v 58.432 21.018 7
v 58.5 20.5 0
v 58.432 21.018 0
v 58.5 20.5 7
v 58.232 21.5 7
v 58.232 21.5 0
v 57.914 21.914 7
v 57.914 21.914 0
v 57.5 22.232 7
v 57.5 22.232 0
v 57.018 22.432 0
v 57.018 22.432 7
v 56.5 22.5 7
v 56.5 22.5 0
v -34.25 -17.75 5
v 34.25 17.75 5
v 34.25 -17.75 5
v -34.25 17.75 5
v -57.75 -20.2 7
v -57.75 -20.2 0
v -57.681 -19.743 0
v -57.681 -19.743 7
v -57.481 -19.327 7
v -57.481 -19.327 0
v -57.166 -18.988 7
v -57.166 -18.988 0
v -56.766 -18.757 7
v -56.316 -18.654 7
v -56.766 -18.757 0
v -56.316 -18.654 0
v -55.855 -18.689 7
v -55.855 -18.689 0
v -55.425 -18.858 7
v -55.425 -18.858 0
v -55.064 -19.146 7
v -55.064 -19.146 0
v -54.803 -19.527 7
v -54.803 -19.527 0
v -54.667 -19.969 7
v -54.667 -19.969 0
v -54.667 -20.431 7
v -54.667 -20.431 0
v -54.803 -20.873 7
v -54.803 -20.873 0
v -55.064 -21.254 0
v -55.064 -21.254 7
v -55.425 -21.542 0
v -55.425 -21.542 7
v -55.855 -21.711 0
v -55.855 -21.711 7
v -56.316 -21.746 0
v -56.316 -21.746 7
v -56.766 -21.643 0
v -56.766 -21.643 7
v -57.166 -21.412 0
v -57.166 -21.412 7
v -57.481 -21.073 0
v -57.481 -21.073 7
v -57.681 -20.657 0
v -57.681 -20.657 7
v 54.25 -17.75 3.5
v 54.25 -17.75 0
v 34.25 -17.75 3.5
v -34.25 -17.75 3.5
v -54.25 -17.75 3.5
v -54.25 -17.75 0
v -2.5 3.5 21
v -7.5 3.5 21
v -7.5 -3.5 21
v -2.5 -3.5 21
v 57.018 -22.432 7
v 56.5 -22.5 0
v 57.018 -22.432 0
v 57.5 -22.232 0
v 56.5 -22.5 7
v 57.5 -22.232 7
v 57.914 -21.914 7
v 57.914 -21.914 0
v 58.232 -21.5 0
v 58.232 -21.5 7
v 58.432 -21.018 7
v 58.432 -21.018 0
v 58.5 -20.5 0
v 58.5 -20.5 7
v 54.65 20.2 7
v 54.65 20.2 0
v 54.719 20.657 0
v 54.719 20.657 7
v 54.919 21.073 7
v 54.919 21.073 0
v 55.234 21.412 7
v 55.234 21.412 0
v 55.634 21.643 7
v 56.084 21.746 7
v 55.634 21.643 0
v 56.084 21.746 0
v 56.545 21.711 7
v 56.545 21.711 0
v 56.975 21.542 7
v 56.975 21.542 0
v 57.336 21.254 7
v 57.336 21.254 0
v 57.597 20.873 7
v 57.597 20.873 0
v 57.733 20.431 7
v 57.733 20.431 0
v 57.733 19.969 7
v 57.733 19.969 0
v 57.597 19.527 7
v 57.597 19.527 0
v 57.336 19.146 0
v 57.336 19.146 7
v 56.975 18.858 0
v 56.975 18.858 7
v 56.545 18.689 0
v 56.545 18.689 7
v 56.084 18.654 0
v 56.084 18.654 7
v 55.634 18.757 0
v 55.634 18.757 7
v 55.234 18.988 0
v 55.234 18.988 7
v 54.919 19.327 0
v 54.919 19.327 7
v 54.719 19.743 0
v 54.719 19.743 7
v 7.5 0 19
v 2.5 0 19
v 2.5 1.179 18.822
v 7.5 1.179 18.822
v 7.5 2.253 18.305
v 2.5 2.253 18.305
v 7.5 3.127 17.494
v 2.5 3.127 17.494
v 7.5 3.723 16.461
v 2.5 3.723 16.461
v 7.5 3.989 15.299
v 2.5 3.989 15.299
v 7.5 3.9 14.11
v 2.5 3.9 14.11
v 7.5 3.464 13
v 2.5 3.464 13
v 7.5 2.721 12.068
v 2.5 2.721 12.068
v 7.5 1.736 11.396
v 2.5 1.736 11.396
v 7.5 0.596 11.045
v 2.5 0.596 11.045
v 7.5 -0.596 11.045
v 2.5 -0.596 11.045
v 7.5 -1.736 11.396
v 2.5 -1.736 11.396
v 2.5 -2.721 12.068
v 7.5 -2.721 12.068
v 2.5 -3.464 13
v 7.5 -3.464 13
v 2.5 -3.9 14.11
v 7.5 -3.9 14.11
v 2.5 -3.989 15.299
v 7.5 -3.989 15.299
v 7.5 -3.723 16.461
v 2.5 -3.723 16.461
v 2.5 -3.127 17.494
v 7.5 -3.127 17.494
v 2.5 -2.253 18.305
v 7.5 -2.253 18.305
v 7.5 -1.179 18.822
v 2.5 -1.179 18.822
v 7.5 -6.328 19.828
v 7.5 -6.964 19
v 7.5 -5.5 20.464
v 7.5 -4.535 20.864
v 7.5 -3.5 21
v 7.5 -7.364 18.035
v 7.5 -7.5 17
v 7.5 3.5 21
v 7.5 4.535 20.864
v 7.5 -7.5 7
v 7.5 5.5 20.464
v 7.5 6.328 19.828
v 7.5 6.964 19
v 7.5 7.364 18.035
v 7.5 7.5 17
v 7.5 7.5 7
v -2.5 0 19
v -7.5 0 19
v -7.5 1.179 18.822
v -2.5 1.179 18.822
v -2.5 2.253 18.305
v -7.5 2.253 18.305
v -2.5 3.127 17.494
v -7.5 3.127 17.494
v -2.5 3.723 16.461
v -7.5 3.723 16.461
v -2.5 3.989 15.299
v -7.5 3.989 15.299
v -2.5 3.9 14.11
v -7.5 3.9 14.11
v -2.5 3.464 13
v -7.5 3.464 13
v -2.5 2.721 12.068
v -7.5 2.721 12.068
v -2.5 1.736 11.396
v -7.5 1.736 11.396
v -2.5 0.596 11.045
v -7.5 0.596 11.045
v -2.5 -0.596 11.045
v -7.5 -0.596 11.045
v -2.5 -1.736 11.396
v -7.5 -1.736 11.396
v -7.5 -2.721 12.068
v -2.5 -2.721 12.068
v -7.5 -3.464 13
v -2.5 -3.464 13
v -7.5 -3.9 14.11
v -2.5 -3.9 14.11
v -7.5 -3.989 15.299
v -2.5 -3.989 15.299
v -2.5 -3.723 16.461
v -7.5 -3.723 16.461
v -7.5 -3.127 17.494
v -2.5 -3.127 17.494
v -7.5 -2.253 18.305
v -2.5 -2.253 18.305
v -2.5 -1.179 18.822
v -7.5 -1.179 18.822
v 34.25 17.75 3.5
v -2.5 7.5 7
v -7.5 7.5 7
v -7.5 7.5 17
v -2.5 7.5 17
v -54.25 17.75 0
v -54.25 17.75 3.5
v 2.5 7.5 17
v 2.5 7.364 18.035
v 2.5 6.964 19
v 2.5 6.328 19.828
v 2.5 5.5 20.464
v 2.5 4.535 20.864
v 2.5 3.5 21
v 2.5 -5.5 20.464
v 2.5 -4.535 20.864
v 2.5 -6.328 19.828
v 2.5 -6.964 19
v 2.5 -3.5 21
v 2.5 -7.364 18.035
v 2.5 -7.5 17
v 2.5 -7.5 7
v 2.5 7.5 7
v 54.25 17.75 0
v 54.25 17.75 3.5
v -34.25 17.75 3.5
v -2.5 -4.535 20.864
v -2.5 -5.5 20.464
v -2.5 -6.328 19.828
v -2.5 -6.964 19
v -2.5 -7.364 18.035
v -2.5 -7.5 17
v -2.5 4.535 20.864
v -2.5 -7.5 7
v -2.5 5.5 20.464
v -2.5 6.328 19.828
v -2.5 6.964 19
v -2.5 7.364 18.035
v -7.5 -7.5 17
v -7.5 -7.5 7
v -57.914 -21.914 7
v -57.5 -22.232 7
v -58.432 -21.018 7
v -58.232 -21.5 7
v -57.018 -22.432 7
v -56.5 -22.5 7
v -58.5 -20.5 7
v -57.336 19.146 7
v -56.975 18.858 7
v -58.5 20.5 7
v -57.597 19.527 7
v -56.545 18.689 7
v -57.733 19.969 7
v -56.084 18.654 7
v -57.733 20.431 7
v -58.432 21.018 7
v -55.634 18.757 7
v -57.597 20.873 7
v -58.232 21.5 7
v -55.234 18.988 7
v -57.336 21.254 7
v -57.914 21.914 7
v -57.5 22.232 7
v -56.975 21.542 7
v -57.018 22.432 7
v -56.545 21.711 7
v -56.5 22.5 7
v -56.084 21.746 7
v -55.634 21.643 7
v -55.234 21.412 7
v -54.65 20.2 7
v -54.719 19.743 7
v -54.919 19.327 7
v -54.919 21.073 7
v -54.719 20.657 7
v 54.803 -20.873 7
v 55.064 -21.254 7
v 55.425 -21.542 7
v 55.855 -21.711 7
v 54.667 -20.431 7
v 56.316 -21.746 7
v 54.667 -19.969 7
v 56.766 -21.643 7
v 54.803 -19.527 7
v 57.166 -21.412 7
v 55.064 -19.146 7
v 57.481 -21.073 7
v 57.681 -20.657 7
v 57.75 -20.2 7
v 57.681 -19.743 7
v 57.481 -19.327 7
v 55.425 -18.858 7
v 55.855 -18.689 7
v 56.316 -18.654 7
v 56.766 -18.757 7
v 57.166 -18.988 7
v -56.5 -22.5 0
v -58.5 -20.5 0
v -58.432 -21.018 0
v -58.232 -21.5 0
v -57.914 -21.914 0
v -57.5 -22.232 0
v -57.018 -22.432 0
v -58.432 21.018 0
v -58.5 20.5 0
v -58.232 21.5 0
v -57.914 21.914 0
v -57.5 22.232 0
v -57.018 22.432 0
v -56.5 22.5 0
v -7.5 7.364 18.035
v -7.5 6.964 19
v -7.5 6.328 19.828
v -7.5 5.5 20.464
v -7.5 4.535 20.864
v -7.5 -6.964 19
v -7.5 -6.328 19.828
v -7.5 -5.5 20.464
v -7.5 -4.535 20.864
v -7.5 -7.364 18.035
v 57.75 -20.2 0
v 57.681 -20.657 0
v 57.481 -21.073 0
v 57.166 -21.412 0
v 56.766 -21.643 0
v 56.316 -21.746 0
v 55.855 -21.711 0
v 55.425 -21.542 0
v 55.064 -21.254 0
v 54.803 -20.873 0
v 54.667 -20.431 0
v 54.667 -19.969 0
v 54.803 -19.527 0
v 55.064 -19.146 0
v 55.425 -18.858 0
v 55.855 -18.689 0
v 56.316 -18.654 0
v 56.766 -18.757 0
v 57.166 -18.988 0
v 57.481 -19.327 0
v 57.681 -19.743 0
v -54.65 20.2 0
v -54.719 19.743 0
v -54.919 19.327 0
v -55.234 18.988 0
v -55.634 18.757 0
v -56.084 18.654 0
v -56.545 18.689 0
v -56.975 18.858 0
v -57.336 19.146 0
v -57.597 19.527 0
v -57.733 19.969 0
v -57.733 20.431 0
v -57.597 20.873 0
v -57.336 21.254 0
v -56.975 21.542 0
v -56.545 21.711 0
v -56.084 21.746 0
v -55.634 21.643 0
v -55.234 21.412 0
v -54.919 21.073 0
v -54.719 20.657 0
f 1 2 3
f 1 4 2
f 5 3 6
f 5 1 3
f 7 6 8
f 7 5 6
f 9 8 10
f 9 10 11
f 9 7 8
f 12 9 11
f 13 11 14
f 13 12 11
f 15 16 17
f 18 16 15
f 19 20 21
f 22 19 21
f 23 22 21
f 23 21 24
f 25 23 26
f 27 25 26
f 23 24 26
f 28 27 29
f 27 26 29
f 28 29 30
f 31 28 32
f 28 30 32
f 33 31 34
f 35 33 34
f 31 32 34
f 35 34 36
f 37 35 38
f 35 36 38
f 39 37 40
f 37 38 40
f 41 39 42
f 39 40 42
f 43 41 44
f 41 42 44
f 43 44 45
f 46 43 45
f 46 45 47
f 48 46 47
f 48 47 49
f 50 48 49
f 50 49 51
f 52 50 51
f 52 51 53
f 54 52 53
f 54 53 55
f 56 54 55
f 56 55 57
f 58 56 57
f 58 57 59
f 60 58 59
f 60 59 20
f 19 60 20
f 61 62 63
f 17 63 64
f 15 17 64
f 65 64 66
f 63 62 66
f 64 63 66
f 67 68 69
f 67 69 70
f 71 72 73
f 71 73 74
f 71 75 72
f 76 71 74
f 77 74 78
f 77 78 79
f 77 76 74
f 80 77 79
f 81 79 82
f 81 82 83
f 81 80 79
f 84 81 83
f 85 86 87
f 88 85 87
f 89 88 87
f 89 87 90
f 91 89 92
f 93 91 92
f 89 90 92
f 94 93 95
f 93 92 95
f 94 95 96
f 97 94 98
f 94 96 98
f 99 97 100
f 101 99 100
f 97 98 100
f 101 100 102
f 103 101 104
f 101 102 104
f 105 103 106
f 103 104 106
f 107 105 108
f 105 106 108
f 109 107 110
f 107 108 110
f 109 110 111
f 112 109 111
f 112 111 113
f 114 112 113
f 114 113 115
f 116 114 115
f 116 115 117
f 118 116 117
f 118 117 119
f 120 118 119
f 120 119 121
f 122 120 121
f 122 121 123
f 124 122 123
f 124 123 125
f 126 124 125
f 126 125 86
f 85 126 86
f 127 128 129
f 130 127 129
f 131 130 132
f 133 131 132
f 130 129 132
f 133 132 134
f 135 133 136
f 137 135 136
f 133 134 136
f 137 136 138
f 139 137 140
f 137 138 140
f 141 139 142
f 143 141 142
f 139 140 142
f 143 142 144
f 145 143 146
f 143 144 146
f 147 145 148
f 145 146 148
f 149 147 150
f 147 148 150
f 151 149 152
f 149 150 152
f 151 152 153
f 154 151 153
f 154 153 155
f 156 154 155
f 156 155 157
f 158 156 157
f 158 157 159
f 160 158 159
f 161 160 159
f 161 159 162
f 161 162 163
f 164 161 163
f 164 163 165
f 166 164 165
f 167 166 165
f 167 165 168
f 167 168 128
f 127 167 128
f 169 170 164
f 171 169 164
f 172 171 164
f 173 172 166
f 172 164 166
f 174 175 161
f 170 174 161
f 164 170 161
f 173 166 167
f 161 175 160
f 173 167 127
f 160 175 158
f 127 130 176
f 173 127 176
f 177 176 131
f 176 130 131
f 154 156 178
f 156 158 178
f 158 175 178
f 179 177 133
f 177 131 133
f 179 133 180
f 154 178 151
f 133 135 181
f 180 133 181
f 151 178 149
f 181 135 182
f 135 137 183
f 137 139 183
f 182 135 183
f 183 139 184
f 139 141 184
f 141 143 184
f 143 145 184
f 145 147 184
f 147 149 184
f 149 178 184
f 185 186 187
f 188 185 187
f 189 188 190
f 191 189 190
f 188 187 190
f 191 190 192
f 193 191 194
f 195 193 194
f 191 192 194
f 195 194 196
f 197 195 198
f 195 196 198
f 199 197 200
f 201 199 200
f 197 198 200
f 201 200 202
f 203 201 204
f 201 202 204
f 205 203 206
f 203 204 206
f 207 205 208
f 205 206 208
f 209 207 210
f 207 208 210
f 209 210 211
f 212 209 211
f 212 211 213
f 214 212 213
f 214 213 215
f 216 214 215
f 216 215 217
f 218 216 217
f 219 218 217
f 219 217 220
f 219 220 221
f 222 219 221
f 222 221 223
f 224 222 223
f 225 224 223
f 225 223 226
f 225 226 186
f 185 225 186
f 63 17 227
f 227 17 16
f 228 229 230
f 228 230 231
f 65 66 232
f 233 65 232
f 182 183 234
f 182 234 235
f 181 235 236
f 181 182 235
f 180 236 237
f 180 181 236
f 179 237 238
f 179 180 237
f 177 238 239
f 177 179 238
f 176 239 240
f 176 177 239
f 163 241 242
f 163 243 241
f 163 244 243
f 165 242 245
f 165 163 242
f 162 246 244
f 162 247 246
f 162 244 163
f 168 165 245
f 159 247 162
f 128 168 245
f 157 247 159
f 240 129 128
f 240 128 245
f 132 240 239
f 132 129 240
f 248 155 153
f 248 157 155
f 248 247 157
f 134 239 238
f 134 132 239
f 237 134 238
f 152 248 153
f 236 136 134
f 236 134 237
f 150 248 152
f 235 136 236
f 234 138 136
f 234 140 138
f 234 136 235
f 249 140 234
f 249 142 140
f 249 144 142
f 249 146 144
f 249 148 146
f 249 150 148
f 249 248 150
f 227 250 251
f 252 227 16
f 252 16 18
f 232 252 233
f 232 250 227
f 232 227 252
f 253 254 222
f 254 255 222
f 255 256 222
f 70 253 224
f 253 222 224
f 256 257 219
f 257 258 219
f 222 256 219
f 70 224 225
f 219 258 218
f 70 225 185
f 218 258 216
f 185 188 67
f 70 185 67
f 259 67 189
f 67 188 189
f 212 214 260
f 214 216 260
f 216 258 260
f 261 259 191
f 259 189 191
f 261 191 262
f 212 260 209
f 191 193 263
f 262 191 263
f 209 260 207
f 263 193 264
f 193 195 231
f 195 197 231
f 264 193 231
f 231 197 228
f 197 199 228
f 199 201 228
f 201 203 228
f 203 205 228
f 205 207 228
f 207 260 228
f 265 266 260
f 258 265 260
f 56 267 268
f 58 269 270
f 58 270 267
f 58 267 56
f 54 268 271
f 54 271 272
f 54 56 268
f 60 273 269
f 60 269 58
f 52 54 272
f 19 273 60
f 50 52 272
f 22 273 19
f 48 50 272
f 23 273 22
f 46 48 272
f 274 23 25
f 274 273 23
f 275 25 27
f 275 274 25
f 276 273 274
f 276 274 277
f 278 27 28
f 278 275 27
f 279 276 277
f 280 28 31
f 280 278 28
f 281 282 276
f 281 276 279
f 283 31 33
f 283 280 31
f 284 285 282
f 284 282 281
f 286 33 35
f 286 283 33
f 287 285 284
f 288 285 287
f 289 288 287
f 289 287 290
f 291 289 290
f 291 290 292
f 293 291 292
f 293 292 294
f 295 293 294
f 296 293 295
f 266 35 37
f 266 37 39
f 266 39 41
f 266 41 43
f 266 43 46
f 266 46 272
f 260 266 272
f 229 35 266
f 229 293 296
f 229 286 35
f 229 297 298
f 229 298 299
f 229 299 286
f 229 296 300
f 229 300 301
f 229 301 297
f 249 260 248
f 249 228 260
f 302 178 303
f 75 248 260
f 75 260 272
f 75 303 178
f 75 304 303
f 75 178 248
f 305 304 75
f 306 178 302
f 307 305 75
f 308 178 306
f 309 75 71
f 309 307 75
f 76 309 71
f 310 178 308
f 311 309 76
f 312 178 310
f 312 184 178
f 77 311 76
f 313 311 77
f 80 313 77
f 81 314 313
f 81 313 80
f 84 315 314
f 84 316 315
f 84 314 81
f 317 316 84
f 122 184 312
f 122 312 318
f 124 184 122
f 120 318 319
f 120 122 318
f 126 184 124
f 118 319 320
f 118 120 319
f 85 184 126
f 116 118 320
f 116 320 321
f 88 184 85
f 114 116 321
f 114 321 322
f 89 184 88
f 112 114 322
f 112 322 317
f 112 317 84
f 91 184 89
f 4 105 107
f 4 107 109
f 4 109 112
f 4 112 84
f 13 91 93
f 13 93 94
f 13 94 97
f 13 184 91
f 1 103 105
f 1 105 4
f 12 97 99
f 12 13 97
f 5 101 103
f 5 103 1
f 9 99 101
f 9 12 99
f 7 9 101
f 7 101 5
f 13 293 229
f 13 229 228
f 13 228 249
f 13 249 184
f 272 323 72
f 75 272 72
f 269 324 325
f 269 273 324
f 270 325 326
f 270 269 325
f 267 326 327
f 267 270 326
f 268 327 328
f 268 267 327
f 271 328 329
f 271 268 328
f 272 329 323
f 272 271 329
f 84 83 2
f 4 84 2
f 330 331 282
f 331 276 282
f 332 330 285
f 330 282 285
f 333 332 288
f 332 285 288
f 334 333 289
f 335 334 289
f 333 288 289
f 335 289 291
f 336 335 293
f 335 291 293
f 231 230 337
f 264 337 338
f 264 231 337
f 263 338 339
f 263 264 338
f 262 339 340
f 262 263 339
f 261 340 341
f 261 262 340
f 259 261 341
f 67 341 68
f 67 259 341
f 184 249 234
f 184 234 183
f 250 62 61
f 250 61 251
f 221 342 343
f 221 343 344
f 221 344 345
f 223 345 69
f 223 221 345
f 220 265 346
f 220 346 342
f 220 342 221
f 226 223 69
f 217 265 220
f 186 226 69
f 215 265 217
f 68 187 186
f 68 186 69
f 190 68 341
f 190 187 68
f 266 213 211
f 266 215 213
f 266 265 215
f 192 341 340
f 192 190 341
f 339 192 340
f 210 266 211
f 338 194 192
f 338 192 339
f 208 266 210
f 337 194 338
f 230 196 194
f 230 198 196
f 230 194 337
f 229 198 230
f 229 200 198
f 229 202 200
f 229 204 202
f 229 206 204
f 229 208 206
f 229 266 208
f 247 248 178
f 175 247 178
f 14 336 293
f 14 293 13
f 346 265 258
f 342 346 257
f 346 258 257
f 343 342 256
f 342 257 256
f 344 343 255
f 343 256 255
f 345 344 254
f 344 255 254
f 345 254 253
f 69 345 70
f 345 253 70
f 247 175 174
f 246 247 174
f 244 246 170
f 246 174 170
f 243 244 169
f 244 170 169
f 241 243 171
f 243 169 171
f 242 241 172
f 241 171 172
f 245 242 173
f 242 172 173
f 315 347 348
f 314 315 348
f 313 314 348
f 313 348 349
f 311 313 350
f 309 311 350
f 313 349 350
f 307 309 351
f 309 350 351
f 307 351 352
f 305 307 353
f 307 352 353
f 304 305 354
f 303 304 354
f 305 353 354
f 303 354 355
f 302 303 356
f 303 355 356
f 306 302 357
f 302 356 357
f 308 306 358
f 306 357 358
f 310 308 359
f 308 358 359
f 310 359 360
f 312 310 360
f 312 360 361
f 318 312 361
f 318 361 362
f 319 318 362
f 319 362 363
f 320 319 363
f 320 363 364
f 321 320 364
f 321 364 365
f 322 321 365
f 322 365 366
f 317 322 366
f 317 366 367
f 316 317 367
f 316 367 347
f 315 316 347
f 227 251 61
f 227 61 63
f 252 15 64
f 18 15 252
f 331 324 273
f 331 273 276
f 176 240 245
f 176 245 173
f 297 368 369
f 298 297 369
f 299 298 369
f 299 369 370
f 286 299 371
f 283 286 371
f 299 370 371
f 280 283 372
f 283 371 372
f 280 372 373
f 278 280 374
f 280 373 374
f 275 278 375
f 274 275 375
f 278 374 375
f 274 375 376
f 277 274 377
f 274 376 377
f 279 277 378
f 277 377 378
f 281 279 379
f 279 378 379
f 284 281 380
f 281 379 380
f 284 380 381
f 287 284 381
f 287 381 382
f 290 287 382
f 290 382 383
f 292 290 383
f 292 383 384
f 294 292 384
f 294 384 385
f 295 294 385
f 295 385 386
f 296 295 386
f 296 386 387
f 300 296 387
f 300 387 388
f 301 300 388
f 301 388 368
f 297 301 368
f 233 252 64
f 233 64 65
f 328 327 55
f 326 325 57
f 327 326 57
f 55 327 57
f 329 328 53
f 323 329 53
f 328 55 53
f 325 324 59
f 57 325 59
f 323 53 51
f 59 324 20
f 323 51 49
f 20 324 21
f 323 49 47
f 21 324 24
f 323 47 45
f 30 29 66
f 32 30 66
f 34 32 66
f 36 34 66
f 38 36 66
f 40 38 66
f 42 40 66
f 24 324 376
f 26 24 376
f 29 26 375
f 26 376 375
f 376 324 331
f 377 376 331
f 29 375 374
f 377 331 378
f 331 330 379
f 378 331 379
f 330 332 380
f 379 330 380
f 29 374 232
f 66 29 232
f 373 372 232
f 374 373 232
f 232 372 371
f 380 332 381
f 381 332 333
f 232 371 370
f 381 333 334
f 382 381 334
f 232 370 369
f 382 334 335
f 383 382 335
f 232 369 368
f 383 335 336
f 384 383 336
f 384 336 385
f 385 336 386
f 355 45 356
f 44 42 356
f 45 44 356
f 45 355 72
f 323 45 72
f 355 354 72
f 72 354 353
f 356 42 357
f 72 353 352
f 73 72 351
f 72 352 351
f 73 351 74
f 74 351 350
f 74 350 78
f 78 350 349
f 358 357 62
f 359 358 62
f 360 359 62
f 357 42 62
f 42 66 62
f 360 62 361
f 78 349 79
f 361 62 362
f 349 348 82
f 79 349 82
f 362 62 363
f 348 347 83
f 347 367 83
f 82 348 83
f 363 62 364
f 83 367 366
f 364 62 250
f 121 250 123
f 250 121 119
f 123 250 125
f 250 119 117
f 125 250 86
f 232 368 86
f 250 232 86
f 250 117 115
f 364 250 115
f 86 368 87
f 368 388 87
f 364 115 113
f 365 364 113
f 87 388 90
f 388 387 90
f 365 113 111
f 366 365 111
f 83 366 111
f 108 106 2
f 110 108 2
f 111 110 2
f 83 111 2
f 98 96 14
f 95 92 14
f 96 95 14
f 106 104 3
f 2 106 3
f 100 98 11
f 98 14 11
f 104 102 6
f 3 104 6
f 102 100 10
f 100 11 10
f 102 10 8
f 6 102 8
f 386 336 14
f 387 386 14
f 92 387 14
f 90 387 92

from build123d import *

# Parameters (mm, degrees)
SKETCH_1_W          = 117
SKETCH_1_H          = 45
EXTRUDE_1_DEPTH     = 7
FILLET_1_R          = 2
SKETCH_2_W          = 108.5
SKETCH_2_H          = 35.5
CUT_EXTRUDE_1_DEPTH = 5
SKETCH_3_R          = 1.55
CUT_EXTRUDE_2_DEPTH = 64.067424238
SKETCH_6_W          = 15
SKETCH_6_H          = 15
EXTRUDE_2_DEPTH     = 14
SKETCH_7_R          = 4
CUT_EXTRUDE_3_DEPTH = 73.823416564
FILLET_2_R          = 4
SKETCH_8_W          = 5
SKETCH_8_H          = 15
CUT_EXTRUDE_4_DEPTH = 20
SKETCH_9_W          = 20
SKETCH_9_H          = 35.5
EXTRUDE_3_DEPTH     = 1.5


with BuildPart() as part:
    # 草图1 → 凸台-拉伸1 (new body)
    with BuildSketch(Plane.XY):
        Rectangle(SKETCH_1_W, SKETCH_1_H)
    extrude(amount=EXTRUDE_1_DEPTH)

    # 圆角1
    fillet_1_edges = [part.edges().sort_by_distance(p)[0] for p in [
        (58.5, -22.5, 3.5),
        (-58.5, -22.5, 3.5),
        (-58.5, 22.5, 3.5),
        (58.5, 22.5, 3.5),
    ]]
    fillet(fillet_1_edges, radius=FILLET_1_R)

    # 草图2 → 切除-拉伸1 (cut)
    with BuildSketch(Plane(origin=(0, 0, 0), x_dir=(-1, 0, 0), z_dir=(0, 0, -1))):
        Rectangle(SKETCH_2_W, SKETCH_2_H)
    extrude(amount=-CUT_EXTRUDE_1_DEPTH, mode=Mode.SUBTRACT)

    # 草图3 → 切除-拉伸2 (cut, through all)
    with BuildSketch(Plane(origin=(0, 0, 0), x_dir=(-1, 0, 0), z_dir=(0, 0, -1))):
        with Locations((-56.2, 20.2)):
            Circle(SKETCH_3_R)
        with Locations(Location((-56.2, -20.2, 0), (0, 0, 180))):
            Circle(SKETCH_3_R)
        with Locations((56.2, -20.2)):
            Circle(SKETCH_3_R)
        with Locations(Location((56.2, 20.2, 0), (0, 0, 180))):
            Circle(SKETCH_3_R)
    extrude(amount=-CUT_EXTRUDE_2_DEPTH, mode=Mode.SUBTRACT)

    # 草图6 → 凸台-拉伸2 (add)
    with BuildSketch(Plane.XY.offset(7)):
        Rectangle(SKETCH_6_W, SKETCH_6_H)
    extrude(amount=EXTRUDE_2_DEPTH)

    # 草图7 → 切除-拉伸3 (cut, through all)
    with BuildSketch(Plane.ZY.offset(7.5)):
        with Locations((15, 0)):
            Circle(SKETCH_7_R)
    extrude(amount=-CUT_EXTRUDE_3_DEPTH, mode=Mode.SUBTRACT)

    # 圆角2
    fillet_2_edges = [part.edges().sort_by_distance(p)[0] for p in [
        (0, -7.5, 21),
        (0, 7.5, 21),
    ]]
    fillet(fillet_2_edges, radius=FILLET_2_R)

    # 草图8 → 切除-拉伸4 (cut)
    with BuildSketch(Plane.XY.offset(7)):
        Rectangle(SKETCH_8_W, SKETCH_8_H)
    extrude(amount=CUT_EXTRUDE_4_DEPTH, mode=Mode.SUBTRACT)

    # 草图9 → 凸台-拉伸3 (add)
    with BuildSketch(Plane(origin=(0, 0, 5), x_dir=(-1, 0, 0), z_dir=(0, 0, -1))):
        with Locations((-44.25, 0)):
            Rectangle(SKETCH_9_W, SKETCH_9_H)
        with Locations((44.25, 0)):
            Rectangle(SKETCH_9_W, SKETCH_9_H)
    extrude(amount=EXTRUDE_3_DEPTH)


solid = part.part
